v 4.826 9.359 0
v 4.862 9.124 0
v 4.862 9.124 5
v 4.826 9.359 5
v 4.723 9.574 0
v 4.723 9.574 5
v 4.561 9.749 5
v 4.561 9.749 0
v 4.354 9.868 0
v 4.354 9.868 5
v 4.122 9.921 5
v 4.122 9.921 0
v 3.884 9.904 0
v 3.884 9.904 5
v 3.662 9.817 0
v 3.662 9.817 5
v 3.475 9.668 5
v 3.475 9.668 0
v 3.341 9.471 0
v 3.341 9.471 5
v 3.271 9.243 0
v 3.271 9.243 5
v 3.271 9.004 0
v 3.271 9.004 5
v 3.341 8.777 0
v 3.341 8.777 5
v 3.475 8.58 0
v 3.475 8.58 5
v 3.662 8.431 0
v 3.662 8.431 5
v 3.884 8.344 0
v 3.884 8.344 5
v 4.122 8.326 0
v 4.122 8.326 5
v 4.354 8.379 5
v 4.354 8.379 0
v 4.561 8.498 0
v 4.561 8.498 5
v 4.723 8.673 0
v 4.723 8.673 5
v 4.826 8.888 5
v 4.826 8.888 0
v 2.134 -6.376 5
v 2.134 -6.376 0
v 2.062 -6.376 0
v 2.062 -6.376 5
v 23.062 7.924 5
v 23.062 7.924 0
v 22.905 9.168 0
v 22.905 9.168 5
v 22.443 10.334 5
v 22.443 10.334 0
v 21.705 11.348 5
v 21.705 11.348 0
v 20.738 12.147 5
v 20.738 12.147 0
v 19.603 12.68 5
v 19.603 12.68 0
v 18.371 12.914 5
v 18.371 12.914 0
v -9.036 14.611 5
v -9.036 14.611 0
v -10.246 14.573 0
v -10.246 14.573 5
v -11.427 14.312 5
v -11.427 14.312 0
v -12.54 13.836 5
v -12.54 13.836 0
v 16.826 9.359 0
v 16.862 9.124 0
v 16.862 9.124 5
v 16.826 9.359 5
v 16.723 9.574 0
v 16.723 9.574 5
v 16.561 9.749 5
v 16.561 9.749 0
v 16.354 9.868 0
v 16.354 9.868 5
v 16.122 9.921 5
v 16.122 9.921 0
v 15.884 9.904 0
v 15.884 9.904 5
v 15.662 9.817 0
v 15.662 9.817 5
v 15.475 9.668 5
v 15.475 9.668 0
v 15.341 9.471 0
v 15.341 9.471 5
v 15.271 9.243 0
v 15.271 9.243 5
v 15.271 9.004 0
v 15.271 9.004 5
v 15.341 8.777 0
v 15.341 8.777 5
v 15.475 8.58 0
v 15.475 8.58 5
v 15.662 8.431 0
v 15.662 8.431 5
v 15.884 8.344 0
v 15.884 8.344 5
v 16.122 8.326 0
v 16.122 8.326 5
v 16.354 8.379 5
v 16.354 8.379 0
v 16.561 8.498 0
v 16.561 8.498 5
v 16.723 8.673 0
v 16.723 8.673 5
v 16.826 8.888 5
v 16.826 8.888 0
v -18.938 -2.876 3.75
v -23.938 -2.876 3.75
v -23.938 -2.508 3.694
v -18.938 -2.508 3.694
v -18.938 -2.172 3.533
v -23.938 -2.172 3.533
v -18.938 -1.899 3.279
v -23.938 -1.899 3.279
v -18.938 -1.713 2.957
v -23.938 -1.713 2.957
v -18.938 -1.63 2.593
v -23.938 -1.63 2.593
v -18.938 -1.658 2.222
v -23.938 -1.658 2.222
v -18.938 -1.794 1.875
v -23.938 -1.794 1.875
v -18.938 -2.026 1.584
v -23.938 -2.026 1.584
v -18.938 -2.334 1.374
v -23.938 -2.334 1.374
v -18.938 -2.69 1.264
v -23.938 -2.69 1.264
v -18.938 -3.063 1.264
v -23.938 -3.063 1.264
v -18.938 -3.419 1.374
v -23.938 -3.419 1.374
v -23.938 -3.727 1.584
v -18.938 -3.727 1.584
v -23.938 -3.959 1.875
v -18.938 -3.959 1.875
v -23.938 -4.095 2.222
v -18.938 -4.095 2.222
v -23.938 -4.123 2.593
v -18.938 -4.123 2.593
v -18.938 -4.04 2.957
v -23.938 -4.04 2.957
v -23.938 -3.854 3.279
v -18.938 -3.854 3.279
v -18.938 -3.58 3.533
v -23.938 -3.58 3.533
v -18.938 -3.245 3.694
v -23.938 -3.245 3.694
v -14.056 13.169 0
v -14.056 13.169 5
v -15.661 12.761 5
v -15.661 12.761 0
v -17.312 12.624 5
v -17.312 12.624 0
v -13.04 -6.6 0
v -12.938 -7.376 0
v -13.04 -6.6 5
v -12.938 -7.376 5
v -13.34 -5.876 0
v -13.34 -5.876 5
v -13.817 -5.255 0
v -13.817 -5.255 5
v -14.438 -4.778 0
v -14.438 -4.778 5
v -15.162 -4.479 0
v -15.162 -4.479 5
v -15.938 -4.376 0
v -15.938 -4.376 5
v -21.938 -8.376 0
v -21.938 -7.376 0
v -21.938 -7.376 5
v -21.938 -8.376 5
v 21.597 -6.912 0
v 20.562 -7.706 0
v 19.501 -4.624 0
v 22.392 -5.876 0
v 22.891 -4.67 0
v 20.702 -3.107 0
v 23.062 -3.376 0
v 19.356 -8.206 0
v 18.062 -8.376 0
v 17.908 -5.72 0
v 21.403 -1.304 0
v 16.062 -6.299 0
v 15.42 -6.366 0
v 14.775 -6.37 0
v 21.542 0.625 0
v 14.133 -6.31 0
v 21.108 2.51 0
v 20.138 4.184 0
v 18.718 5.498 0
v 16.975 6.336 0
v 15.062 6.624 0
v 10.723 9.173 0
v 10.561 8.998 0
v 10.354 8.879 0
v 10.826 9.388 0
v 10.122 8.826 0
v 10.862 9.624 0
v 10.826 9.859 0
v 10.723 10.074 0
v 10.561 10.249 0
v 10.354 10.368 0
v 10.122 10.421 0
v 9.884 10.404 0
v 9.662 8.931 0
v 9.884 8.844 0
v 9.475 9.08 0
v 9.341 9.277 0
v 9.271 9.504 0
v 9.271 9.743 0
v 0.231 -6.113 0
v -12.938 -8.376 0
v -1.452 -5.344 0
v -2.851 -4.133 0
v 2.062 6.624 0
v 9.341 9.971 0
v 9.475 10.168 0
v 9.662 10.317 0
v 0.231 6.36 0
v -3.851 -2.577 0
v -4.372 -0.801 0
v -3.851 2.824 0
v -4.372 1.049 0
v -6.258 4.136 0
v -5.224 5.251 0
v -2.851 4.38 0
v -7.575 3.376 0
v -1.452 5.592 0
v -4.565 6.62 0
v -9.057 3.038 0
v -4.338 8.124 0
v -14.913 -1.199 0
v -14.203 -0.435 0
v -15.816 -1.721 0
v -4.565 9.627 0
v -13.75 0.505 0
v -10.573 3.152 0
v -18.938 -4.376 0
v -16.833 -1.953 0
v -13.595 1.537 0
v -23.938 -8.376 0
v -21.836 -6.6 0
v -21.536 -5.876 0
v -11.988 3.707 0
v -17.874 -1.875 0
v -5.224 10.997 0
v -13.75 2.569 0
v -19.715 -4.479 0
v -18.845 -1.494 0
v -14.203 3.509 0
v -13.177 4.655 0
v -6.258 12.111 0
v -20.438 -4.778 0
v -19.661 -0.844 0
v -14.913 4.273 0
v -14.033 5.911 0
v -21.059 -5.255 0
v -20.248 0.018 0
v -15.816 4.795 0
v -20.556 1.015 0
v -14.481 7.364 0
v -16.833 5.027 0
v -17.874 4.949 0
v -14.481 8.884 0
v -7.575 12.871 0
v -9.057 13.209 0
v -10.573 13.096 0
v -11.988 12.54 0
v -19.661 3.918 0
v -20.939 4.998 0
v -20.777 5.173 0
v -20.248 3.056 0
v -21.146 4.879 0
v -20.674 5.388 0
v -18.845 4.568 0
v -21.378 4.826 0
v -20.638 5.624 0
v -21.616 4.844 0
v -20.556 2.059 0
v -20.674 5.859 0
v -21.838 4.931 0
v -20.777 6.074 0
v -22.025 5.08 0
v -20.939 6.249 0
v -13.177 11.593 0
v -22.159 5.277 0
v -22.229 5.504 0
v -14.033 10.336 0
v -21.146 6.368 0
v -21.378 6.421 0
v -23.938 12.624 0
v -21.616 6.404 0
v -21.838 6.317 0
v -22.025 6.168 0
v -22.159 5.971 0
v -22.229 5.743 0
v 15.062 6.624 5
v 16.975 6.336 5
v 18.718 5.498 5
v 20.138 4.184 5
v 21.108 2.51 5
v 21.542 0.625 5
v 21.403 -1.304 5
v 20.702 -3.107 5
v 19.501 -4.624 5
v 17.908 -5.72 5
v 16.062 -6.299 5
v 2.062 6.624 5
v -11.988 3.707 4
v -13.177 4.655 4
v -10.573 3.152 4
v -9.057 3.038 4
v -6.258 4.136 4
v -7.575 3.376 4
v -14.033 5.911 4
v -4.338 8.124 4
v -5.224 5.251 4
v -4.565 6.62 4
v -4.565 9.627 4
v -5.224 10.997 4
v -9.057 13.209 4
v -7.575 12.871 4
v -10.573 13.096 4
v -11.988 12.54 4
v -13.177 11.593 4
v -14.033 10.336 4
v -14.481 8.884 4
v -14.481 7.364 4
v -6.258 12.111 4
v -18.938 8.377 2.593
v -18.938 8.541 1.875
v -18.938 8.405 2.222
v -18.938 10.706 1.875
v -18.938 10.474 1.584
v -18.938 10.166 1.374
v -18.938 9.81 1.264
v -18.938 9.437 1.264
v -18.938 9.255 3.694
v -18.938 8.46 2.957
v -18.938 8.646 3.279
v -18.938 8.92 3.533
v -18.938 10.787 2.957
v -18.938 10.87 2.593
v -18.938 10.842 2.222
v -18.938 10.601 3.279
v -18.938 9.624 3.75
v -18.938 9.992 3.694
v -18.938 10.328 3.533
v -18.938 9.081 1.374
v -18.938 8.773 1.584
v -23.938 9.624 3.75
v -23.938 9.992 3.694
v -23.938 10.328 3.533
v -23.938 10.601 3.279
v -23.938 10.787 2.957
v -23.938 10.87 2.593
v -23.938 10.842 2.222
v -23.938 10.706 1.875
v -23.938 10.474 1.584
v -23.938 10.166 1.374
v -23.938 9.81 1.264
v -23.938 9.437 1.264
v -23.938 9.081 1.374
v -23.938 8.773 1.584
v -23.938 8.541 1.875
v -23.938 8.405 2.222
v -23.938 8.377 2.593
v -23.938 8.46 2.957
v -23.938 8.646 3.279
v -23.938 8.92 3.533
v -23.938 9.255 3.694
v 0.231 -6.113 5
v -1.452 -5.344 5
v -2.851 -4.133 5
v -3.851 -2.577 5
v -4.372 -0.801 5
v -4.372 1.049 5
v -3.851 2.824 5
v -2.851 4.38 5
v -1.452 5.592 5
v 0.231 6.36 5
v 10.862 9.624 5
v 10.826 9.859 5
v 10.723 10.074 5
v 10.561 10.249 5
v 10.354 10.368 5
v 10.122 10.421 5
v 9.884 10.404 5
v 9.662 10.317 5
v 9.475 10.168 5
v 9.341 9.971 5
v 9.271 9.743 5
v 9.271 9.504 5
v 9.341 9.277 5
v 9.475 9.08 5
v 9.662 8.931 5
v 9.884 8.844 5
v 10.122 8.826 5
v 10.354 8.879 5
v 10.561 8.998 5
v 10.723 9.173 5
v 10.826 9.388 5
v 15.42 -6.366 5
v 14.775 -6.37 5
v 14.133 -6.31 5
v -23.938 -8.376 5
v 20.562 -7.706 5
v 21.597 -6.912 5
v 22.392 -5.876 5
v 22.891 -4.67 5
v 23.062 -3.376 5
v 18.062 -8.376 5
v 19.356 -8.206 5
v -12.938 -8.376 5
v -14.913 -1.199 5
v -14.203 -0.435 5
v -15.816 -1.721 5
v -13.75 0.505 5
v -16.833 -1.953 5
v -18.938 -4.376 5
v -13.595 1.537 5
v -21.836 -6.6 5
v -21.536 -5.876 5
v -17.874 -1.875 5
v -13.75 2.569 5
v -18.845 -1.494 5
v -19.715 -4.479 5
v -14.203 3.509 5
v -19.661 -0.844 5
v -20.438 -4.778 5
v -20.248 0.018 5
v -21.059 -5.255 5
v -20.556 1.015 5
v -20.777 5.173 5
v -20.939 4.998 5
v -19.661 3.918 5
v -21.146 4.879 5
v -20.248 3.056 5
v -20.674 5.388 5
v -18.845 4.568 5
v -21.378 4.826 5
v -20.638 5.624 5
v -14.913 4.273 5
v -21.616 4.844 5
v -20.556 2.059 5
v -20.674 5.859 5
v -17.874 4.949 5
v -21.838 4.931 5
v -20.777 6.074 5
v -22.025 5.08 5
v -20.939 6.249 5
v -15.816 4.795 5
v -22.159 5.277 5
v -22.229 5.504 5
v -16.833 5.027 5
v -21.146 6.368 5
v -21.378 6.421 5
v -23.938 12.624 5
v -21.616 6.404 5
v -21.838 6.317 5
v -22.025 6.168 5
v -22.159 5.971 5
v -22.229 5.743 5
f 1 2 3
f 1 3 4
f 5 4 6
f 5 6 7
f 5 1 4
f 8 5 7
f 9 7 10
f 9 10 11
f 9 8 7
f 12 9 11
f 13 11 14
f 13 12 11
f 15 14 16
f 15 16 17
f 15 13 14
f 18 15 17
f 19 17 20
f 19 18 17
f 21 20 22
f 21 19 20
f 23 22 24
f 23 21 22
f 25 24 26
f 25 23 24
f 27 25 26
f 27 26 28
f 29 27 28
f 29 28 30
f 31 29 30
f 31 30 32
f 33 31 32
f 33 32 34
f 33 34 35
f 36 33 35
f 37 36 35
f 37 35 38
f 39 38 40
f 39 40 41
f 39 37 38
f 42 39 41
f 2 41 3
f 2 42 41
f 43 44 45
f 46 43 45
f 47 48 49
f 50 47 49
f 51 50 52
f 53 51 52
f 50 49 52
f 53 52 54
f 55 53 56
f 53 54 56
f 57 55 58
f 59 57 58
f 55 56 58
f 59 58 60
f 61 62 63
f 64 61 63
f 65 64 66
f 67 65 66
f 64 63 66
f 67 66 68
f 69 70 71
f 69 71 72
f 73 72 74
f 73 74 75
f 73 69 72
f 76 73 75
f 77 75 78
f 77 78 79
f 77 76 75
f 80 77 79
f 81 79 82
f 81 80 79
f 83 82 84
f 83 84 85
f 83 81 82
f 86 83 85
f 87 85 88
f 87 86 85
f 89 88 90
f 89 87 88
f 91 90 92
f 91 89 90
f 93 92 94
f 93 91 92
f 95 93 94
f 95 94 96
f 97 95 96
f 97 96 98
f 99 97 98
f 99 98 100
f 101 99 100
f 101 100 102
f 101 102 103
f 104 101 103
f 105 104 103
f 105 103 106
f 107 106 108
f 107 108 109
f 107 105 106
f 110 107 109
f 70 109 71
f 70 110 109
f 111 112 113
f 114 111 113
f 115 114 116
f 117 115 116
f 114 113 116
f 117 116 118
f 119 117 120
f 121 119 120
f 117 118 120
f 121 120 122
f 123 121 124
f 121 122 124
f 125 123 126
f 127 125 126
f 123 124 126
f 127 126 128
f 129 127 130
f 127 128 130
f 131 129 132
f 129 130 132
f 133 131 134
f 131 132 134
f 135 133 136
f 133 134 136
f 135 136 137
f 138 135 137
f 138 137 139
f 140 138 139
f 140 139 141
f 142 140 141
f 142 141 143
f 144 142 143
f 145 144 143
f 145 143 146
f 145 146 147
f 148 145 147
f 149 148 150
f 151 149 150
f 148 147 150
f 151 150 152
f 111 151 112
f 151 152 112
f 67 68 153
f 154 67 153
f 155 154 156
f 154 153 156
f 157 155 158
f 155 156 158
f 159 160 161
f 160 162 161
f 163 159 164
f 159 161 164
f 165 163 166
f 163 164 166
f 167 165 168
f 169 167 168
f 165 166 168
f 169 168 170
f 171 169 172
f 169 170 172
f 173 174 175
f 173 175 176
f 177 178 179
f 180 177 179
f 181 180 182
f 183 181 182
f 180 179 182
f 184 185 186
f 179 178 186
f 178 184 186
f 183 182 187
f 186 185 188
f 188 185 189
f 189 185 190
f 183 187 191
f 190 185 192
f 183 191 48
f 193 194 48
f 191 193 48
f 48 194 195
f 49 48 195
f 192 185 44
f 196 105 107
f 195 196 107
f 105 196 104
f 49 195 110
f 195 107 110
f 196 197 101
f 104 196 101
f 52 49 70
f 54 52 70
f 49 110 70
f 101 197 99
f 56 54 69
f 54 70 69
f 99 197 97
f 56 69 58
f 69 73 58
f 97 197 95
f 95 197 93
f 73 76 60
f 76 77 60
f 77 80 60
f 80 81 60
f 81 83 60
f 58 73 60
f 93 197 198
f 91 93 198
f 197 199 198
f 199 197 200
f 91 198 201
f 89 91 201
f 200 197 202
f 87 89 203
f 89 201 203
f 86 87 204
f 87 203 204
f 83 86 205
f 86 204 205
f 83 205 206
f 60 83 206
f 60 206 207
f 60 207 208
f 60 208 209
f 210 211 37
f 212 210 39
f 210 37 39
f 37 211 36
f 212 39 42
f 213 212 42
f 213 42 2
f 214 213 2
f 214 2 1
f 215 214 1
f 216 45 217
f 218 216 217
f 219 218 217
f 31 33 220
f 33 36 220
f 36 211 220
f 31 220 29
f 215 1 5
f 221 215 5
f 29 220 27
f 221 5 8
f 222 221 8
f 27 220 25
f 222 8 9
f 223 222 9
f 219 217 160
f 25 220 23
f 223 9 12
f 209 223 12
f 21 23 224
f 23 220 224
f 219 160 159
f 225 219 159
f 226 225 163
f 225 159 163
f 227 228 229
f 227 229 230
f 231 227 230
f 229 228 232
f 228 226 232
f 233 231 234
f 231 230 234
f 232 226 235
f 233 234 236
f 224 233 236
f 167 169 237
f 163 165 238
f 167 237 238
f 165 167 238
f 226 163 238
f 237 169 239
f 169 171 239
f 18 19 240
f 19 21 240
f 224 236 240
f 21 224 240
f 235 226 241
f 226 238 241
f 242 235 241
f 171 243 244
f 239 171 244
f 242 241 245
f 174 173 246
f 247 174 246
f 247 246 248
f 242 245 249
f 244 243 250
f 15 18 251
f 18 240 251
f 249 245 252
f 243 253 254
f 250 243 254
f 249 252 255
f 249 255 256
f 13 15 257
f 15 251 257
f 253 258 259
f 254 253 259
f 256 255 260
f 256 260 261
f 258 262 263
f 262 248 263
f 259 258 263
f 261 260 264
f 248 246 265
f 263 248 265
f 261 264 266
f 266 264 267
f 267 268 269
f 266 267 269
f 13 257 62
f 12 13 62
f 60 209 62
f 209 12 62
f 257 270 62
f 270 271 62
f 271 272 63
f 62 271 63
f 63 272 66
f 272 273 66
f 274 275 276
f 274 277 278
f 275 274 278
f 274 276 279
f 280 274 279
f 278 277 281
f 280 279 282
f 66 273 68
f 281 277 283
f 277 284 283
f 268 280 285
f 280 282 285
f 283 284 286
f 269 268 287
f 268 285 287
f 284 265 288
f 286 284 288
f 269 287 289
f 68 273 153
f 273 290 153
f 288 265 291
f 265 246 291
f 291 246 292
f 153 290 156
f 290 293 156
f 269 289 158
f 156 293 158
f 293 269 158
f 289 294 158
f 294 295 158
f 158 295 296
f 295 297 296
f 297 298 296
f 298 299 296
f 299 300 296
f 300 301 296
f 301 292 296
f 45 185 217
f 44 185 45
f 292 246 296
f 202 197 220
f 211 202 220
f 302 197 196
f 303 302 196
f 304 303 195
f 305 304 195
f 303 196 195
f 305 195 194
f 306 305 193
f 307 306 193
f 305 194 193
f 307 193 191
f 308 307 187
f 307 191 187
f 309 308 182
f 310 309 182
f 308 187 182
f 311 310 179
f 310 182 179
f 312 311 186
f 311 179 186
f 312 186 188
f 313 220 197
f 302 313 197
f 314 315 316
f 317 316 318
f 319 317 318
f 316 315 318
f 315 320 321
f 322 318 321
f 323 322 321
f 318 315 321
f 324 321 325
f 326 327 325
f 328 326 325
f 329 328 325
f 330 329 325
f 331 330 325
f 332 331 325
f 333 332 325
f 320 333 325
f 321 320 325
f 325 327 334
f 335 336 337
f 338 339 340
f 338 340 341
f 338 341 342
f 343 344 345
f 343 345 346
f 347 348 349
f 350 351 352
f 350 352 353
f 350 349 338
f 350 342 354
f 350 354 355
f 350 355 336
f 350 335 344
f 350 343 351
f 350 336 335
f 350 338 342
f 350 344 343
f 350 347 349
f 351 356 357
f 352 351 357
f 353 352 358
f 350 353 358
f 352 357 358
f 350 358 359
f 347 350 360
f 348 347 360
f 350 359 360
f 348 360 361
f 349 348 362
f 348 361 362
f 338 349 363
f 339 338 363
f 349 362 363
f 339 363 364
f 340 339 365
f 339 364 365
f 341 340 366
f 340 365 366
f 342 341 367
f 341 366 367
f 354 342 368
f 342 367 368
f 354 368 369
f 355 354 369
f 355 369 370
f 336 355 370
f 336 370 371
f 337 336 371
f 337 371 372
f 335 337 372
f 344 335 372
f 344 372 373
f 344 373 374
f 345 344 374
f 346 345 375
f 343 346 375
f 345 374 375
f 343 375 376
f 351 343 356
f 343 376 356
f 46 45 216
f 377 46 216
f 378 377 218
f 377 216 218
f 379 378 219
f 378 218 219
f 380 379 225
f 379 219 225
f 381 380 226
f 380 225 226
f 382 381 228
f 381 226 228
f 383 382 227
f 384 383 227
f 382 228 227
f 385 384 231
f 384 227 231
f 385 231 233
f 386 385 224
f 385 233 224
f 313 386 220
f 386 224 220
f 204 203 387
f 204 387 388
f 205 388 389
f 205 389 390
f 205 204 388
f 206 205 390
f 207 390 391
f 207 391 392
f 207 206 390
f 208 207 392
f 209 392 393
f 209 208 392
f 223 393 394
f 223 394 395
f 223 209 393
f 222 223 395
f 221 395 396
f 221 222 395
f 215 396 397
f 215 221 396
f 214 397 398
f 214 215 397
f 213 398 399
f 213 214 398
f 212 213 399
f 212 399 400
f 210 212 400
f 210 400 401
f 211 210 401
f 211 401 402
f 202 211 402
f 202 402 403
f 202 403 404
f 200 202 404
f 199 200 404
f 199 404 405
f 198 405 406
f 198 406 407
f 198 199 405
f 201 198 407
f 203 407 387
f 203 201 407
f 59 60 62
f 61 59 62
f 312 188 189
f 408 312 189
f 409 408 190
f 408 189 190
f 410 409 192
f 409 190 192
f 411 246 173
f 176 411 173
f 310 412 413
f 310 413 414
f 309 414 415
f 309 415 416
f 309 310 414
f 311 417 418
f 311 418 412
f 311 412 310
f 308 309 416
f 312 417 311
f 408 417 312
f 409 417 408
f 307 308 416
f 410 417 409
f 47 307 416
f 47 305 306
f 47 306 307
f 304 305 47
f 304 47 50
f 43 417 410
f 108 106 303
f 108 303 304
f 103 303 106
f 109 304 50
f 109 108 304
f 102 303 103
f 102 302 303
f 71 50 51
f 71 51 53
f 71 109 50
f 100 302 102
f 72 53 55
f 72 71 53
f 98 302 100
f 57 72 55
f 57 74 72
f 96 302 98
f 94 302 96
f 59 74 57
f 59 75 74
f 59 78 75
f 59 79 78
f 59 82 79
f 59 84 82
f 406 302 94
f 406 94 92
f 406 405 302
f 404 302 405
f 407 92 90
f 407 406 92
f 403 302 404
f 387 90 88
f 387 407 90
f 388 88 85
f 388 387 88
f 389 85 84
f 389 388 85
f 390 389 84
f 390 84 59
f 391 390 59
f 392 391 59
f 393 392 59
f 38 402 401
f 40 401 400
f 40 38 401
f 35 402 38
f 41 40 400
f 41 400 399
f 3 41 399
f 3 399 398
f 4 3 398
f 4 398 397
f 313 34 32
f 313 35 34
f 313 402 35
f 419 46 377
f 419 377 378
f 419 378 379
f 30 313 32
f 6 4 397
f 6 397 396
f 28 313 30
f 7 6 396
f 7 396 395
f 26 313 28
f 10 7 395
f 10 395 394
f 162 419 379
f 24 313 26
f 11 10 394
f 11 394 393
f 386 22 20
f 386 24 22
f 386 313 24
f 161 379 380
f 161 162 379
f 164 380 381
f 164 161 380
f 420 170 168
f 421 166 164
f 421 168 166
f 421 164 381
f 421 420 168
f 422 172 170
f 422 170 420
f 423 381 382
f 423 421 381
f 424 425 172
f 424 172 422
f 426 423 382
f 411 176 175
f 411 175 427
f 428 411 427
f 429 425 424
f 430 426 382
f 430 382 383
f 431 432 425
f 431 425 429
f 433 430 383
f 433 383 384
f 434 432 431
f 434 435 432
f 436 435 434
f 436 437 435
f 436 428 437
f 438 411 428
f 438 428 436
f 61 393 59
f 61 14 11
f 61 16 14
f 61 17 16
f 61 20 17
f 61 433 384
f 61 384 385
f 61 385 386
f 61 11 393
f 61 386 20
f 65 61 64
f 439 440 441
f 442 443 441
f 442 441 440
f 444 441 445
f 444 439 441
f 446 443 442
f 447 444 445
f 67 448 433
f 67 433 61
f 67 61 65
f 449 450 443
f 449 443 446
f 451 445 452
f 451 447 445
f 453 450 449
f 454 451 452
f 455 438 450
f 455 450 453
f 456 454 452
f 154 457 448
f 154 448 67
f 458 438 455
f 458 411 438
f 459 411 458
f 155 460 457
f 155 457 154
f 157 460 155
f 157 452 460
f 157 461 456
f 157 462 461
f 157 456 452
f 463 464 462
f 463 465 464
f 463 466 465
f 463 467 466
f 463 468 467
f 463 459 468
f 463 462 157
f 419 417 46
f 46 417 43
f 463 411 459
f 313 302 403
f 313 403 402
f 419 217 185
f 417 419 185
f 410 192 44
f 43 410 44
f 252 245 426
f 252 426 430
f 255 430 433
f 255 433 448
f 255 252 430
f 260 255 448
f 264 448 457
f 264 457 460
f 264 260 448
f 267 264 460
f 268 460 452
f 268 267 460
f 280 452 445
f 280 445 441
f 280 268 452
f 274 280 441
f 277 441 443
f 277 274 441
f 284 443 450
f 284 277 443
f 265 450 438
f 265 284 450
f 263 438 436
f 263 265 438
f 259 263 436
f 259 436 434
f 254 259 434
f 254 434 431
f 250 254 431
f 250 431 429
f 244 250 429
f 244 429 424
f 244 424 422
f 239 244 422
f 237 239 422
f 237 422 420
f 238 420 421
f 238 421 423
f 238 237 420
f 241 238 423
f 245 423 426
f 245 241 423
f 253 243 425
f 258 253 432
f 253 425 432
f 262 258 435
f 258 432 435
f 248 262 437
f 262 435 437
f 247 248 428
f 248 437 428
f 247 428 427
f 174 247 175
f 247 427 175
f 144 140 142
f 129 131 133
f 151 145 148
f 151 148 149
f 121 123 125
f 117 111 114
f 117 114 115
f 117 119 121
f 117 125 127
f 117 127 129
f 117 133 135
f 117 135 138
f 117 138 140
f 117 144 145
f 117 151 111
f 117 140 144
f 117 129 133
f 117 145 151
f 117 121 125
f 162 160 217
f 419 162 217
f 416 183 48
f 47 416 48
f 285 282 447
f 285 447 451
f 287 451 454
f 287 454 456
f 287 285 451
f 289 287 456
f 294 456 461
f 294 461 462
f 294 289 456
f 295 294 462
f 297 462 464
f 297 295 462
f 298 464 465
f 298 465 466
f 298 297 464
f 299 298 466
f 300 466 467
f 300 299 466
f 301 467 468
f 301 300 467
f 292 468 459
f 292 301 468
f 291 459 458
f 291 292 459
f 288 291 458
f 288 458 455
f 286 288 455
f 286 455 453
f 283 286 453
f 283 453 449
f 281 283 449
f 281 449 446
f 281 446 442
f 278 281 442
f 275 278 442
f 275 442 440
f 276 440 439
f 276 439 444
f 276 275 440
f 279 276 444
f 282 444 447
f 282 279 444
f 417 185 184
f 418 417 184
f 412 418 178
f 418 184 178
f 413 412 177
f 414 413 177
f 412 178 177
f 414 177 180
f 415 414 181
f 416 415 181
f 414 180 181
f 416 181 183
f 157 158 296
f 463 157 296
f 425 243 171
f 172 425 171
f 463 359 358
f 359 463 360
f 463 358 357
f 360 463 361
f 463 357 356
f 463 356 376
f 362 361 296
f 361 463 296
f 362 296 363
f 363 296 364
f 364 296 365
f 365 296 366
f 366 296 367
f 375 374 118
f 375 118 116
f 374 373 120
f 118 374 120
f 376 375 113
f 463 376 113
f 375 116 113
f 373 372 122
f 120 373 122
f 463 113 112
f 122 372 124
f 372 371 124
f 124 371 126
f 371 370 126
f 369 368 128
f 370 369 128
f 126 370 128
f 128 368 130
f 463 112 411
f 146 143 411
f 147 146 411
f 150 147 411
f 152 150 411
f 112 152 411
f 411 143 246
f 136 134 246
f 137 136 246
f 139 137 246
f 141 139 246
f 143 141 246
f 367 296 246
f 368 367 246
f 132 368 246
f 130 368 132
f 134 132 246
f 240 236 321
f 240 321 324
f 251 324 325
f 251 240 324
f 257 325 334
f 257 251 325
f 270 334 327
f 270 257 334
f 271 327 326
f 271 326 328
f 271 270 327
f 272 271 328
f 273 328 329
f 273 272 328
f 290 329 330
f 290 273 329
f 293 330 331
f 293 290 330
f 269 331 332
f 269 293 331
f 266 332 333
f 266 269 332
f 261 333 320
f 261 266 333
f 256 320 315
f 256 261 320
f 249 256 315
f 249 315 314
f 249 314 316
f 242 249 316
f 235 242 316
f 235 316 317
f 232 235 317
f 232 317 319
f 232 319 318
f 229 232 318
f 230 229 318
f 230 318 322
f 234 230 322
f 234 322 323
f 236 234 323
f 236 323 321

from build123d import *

# Parameters (mm, degrees)
SKETCH1_R           = 0.8
SKETCH1_R_2         = 3.5
SKETCH1_R_3         = 5.1
BOSS_EXTRUDE1_DEPTH = 5
SKETCH2_R           = 1.25
CUT_EXTRUDE1_DEPTH  = 5
BOSS_EXTRUDE2_START = -1
SKETCH21_R          = 5.1
BOSS_EXTRUDE2_DEPTH = 1
SKETCH22_W          = 9
SKETCH22_H          = 4
CUT_EXTRUDE2_DEPTH  = 10
FILLET1_R           = 3


with BuildPart() as part:
    # Sketch1 → Boss-Extrude1 (new body)
    with BuildSketch(Plane(origin=(0, 0, 0), x_dir=(0, 1, 0), z_dir=(0, 0, 1))):
        with BuildLine():
            ThreePointArc((7.923715338, -23.061842121), (11.348253353, -21.704991773), (12.914157128, -18.370857874))
            Line((12.914157128, -18.370857874), (14.611258571, 9.036437401))
            ThreePointArc((14.611258571, 9.036437401), (14.470096631, 10.842810788), (13.835805455, 12.540039768))
            ThreePointArc((13.835805455, 12.540039768), (12.931450551, 14.850335933), (12.623684243, 17.312165753))
            Line((12.623684243, 17.312165753), (12.623684243, 23.938157879))
            Line((12.623684243, 23.938157879), (-8.376315757, 23.938157879))
            Line((-8.376315757, 23.938157879), (-8.376315757, -18.061842121))
            ThreePointArc((-8.376315757, -18.061842121), (-6.911849663, -21.597376027), (-3.376315757, -23.061842121))
            Line((-3.376315757, -23.061842121), (7.923715338, -23.061842121))
        make_face()
        with BuildLine():
            Line((-6.37591859, -2.133696229), (-6.376315757, -2.061842121))
            ThreePointArc((-6.376315757, -2.061842121), (0.123684243, 4.438157879), (6.623684243, -2.061842121))
            Line((6.623684243, -2.061842121), (6.623684243, -15.061842121))
            ThreePointArc((6.623684243, -15.061842121), (0.625179068, -21.542467318), (-6.298932046, -16.061842121))
            ThreePointArc((-6.298932046, -16.061842121), (-6.376216465, -15.097769724), (-6.309594086, -14.132901895))
            Line((-6.309594086, -14.132901895), (-6.37591859, -2.133696229))
        make_face(mode=Mode.SUBTRACT)
        with Locations(Location((9.123684243, -16.061842121, 0), (0, 0, 270))):
            Circle(SKETCH1_R, mode=Mode.SUBTRACT)
        with Locations(Location((9.623684243, -10.061842121, 0), (0, 0, 270))):
            Circle(SKETCH1_R, mode=Mode.SUBTRACT)
        with Locations(Location((9.123684243, -4.061842121, 0), (0, 0, 270))):
            Circle(SKETCH1_R, mode=Mode.SUBTRACT)
        with Locations(Location((1.537022692, 17.094912388, 0), (0, 0, 270))):
            Circle(SKETCH1_R_2, mode=Mode.SUBTRACT)
        with Locations(Location((8.123684243, 9.438157879, 0), (0, 0, 270))):
            Circle(SKETCH1_R_3, mode=Mode.SUBTRACT)
        with Locations(Location((5.623684243, 21.438157879, 0), (0, 0, 270))):
            Circle(SKETCH1_R, mode=Mode.SUBTRACT)
    extrude(amount=BOSS_EXTRUDE1_DEPTH)

    # Sketch2 → Cut-Extrude1 (cut)
    with BuildSketch(Plane(origin=(-23.938157879, 0, 0), x_dir=(0, -1, 0), z_dir=(-1, 0, 0))):
        with Locations(Location((-9.623684243, 2.5, 0), (0, 0, 90))):
            Circle(SKETCH2_R)
        with Locations(Location((2.876315757, 2.5, 0), (0, 0, 90))):
            Circle(SKETCH2_R)
    extrude(amount=-CUT_EXTRUDE1_DEPTH, mode=Mode.SUBTRACT)

    # Sketch21 → Boss-Extrude2 (add)
    with BuildSketch(Plane.XY.offset(5).offset(BOSS_EXTRUDE2_START)):
        with Locations((-9.438157879, 8.123684243)):
            Circle(SKETCH21_R)
    extrude(amount=BOSS_EXTRUDE2_DEPTH)

    # Sketch22 → Cut-Extrude2 (cut)
    with BuildSketch(Plane(origin=(0, 0, 0), x_dir=(1, 0, 0), z_dir=(0, 0, -1))):
        with Locations((-17.438157879, 6.376315757)):
            Rectangle(SKETCH22_W, SKETCH22_H)
    extrude(amount=-CUT_EXTRUDE2_DEPTH, mode=Mode.SUBTRACT)

    # Fillet1
    fillet1_edges = [part.edges().sort_by_distance(p)[0] for p in [
        (-12.938157879, -4.376315757, 2.5),
        (-21.938157879, -4.376315757, 2.5),
    ]]
    fillet(fillet1_edges, radius=FILLET1_R)


solid = part.part
